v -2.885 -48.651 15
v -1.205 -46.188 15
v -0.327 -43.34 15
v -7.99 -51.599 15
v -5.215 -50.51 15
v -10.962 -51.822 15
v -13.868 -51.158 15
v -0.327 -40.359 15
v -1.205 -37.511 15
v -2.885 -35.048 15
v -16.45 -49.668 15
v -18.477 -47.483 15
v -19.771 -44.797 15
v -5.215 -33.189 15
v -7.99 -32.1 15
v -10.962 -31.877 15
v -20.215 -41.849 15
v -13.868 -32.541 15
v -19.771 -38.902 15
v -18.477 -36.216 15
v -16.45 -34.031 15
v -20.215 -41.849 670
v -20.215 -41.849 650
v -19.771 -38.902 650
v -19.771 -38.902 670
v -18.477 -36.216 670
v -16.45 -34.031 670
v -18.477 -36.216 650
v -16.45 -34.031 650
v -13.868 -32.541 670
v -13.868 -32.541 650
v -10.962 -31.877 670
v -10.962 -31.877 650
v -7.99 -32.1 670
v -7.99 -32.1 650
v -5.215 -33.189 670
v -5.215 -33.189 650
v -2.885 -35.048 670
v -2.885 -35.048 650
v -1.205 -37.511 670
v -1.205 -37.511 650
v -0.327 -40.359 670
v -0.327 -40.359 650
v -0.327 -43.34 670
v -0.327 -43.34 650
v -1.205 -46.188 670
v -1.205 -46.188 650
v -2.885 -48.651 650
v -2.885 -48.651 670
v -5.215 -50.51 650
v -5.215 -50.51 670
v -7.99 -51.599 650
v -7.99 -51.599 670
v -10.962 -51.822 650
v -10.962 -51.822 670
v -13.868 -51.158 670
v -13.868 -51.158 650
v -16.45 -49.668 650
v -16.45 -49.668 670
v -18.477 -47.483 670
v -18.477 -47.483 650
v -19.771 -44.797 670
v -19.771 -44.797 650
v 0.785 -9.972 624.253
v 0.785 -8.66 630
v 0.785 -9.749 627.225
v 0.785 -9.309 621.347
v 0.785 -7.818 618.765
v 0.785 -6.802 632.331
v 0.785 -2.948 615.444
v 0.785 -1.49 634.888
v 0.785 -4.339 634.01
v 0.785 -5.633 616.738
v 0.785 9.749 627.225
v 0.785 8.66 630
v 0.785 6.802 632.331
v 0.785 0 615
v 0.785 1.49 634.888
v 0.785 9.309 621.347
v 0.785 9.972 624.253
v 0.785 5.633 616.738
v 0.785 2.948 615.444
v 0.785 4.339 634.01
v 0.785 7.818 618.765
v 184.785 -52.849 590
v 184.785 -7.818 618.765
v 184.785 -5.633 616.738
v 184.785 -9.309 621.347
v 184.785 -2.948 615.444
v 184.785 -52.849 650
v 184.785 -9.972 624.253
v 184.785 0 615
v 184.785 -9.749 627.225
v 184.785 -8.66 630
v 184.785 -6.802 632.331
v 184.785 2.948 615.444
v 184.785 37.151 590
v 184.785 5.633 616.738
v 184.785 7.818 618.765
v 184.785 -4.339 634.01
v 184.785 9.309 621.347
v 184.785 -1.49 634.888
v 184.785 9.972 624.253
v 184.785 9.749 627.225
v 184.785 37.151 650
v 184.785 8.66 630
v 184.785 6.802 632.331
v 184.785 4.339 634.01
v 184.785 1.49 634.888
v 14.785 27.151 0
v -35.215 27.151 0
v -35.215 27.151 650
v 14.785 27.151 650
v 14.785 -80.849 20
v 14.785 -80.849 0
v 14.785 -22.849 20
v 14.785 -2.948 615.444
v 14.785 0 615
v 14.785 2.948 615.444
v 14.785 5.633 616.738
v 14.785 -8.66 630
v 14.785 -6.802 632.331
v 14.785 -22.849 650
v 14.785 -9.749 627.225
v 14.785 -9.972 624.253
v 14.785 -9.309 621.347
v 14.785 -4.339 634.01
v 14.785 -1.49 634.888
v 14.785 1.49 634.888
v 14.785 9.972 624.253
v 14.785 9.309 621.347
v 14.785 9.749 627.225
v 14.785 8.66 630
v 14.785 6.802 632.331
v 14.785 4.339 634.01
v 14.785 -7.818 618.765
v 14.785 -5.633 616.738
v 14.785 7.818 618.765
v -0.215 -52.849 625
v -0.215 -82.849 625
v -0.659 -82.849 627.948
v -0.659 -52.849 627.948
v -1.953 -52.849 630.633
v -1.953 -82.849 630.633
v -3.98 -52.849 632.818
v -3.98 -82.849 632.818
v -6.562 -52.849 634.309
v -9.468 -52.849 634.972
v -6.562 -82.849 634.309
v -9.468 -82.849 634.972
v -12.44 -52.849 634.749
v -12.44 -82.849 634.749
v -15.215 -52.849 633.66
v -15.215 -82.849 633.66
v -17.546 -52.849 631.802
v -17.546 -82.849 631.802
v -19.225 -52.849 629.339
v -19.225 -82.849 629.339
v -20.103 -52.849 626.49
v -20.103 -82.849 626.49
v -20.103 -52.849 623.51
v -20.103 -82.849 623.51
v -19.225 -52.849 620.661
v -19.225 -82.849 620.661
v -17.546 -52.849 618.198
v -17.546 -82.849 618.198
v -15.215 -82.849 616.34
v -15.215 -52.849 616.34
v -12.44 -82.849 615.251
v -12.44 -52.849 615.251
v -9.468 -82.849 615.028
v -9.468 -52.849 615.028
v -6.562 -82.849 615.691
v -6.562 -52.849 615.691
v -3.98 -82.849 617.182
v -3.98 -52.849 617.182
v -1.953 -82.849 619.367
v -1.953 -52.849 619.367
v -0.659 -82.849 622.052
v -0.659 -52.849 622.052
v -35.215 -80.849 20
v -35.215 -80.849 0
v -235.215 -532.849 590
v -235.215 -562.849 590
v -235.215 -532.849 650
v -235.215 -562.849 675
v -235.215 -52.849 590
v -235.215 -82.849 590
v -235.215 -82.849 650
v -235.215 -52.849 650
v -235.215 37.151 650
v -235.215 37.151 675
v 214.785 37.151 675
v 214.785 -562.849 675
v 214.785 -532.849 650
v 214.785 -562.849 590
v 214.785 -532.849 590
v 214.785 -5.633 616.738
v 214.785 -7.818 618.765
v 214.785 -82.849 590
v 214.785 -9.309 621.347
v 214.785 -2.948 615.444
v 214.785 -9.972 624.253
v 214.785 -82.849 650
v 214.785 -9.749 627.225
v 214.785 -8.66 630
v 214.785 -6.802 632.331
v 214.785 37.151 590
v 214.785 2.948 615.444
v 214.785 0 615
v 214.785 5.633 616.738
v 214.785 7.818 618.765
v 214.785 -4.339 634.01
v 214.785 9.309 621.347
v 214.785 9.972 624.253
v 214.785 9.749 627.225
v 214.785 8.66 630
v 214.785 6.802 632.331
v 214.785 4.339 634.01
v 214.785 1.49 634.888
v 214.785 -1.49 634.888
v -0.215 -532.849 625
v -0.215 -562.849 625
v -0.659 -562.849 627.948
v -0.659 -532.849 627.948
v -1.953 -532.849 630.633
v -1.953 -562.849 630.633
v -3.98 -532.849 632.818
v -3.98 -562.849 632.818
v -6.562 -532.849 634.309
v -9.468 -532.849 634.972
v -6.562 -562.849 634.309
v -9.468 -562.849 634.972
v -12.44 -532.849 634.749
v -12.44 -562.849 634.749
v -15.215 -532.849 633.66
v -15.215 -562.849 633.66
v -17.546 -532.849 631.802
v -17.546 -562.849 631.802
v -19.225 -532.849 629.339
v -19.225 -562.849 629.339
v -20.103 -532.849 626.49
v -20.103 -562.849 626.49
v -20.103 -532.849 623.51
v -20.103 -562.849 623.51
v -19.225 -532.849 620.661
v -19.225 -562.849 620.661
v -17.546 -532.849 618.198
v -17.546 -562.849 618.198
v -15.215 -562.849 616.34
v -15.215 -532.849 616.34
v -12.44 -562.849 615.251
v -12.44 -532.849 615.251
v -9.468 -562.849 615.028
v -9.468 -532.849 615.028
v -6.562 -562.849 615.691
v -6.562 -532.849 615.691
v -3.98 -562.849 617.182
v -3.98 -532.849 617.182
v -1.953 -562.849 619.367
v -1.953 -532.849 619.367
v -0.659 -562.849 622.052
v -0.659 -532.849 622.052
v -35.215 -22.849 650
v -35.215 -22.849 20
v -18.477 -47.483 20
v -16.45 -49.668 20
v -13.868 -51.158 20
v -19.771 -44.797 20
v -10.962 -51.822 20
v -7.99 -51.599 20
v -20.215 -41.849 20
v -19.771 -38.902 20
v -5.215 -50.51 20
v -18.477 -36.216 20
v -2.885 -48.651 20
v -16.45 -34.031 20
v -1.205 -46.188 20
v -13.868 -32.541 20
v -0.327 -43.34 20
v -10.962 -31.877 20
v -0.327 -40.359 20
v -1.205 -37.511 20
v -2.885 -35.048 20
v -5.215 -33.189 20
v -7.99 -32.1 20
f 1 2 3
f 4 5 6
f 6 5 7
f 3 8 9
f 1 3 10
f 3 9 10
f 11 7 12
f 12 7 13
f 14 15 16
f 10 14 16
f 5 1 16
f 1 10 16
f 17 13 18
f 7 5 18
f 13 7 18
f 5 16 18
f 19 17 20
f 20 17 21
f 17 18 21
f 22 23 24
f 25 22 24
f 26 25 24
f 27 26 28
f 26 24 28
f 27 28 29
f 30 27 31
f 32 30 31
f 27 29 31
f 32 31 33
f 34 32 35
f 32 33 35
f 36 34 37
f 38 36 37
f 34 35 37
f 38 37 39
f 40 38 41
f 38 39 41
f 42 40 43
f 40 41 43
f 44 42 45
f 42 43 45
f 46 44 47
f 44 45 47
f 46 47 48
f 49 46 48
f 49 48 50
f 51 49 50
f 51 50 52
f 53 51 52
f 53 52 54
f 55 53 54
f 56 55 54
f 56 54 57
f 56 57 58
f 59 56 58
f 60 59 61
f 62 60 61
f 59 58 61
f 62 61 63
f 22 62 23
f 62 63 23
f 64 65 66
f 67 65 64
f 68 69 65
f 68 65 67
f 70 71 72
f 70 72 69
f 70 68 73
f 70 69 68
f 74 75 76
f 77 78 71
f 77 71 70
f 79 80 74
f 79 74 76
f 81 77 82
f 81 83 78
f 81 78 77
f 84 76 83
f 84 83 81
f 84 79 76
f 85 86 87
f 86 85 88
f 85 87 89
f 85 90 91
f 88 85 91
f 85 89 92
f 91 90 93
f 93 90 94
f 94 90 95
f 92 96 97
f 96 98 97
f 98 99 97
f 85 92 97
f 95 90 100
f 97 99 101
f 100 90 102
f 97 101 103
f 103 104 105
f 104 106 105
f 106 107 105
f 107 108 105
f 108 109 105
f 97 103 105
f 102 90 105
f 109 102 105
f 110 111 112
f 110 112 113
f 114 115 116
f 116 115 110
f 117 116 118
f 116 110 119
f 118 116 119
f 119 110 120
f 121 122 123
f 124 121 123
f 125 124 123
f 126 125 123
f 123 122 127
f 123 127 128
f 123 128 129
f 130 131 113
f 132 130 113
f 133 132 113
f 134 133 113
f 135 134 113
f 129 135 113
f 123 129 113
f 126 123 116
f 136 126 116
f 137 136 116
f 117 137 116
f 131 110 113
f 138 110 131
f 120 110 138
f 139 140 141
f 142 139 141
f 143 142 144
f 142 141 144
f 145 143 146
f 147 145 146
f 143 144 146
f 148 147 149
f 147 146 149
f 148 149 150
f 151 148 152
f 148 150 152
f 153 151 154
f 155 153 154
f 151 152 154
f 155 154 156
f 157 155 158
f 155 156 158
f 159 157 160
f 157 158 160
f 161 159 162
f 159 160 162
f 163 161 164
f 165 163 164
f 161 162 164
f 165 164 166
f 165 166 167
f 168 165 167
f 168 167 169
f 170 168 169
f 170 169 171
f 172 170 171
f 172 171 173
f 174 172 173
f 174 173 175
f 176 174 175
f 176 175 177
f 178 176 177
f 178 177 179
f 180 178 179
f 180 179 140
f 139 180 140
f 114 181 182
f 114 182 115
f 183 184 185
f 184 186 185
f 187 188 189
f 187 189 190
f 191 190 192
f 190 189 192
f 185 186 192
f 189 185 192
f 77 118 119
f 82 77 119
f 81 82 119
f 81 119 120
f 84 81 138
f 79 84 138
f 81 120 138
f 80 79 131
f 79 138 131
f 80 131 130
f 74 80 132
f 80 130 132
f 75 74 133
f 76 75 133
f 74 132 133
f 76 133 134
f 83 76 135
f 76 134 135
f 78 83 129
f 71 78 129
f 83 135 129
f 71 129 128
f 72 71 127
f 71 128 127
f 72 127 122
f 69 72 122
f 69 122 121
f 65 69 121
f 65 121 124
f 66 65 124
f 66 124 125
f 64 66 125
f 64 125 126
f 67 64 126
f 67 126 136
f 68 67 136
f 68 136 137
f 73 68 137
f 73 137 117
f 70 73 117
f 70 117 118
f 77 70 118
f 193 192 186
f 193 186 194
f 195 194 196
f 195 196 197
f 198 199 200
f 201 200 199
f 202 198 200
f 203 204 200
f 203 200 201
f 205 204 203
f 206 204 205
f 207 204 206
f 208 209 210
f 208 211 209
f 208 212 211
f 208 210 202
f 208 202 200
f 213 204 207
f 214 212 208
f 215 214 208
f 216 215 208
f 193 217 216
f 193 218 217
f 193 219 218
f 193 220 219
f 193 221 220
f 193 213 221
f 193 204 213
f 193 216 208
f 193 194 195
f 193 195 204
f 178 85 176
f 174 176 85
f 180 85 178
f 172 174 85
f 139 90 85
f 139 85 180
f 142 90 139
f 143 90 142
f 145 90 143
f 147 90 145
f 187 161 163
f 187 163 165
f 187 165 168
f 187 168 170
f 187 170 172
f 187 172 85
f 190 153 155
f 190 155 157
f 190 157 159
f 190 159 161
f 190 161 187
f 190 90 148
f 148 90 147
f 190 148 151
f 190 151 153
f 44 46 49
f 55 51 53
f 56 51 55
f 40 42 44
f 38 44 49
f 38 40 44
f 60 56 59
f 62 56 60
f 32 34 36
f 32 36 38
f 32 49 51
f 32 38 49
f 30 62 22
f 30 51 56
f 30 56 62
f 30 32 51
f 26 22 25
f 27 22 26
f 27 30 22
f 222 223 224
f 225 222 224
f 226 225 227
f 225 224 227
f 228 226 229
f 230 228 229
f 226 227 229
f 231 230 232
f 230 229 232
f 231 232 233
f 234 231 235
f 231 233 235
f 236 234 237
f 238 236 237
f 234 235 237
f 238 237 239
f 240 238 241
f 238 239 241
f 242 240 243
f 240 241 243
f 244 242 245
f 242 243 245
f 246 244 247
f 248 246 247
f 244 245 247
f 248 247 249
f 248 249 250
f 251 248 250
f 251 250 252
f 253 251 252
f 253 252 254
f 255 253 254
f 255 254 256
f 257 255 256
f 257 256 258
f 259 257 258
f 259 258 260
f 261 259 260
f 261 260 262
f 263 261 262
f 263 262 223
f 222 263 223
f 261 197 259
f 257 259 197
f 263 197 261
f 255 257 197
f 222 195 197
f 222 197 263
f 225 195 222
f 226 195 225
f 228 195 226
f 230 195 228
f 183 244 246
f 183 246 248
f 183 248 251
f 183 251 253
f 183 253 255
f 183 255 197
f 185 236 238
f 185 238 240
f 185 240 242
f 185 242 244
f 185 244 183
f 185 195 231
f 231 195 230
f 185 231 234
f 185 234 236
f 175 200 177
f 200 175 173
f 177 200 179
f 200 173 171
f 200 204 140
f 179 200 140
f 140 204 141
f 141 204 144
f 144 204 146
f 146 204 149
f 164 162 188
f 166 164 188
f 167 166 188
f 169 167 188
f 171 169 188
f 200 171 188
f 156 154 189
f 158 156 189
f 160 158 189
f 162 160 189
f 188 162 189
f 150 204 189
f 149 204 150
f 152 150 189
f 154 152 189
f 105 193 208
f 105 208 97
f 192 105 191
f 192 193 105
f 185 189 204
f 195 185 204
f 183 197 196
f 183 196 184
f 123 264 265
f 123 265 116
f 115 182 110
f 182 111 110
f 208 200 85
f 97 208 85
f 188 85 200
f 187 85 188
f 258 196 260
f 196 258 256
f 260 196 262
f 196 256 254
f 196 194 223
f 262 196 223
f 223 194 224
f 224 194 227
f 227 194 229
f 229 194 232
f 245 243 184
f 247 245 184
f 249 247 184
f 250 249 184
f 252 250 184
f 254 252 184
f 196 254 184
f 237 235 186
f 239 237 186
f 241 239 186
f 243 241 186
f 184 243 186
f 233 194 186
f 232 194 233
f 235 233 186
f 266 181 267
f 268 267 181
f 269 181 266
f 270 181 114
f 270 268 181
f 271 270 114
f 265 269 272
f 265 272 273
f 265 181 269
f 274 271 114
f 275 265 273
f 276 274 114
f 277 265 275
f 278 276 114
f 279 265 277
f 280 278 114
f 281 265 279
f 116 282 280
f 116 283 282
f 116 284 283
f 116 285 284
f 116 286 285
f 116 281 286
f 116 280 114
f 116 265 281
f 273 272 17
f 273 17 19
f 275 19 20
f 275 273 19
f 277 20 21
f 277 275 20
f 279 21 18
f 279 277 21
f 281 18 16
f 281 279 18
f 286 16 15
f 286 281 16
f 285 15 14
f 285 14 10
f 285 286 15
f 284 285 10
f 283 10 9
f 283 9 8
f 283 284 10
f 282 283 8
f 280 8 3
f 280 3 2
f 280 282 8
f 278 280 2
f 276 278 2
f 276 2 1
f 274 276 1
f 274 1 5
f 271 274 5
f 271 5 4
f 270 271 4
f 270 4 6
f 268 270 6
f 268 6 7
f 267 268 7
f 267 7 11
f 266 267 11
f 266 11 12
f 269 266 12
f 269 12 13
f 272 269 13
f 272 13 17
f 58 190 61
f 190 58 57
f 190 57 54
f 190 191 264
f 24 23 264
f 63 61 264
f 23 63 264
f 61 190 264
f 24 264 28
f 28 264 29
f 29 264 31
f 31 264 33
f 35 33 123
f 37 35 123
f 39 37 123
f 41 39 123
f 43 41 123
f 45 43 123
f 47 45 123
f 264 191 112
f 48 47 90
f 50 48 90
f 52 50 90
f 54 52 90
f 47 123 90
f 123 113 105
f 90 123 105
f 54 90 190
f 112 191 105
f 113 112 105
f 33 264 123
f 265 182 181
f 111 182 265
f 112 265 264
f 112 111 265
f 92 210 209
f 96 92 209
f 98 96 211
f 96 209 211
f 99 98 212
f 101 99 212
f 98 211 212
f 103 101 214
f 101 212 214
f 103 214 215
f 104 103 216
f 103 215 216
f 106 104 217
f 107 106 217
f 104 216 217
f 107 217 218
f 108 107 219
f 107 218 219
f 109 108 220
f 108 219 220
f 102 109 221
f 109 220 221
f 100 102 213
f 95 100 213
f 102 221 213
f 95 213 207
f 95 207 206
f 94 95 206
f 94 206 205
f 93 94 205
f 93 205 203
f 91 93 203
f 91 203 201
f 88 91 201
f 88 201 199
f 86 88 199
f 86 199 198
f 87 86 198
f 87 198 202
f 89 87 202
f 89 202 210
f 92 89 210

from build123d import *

# Parameters (mm, degrees)
SKETCH1_W               = 50
SKETCH1_H               = 50
BOSS_EXTRUDE1_DEPTH     = 650
SKETCH2_W               = 450
SKETCH2_H               = 600
BOSS_EXTRUDE2_DEPTH     = 25
SKETCH4_W               = 450
SKETCH4_H               = 30
BOSS_EXTRUDE3_DEPTH     = 60
SKETCH5_R               = 10
CUT_EXTRUDE1_DEPTH      = 510
SKETCH7_W               = 50
SKETCH7_H               = 20
BOSS_EXTRUDE4_DEPTH     = 58
SKETCH8_R               = 10
CUT_EXTRUDE3_DEPTH      = 635
CUT_EXTRUDE3_DEPTH_BACK = 20
SKETCH9_W               = 30
SKETCH9_H               = 90
BOSS_EXTRUDE5_DEPTH     = 60
SKETCH10_R              = 10
CUT_EXTRUDE4_DEPTH      = 214


with BuildPart() as part:
    # Sketch1 → Boss-Extrude1 (new body)
    with BuildSketch(Plane.XY):
        with Locations((-10.215053763, 2.150537634)):
            Rectangle(SKETCH1_W, SKETCH1_H)
    extrude(amount=BOSS_EXTRUDE1_DEPTH)

    # Sketch2 → Boss-Extrude2 (add)
    with BuildSketch(Plane.XY.offset(650)):
        with Locations((-10.215053763, -262.849462366)):
            Rectangle(SKETCH2_W, SKETCH2_H)
    extrude(amount=BOSS_EXTRUDE2_DEPTH)

    # Sketch4 → Boss-Extrude3 (add)
    with BuildSketch(Plane(origin=(0, 0, 650), x_dir=(-1, 0, 0), z_dir=(0, 0, -1))):
        with Locations((10.215053763, -547.849462366)):
            Rectangle(SKETCH4_W, SKETCH4_H)
        with Locations((10.215053763, -67.849462366)):
            Rectangle(SKETCH4_W, SKETCH4_H)
    extrude(amount=BOSS_EXTRUDE3_DEPTH)

    # Sketch5 → Cut-Extrude1 (cut)
    with BuildSketch(Plane.XZ.offset(562.849462366)):
        with Locations((-10.215053763, 625)):
            Circle(SKETCH5_R)
    extrude(amount=-CUT_EXTRUDE1_DEPTH, mode=Mode.SUBTRACT)

    # Sketch7 → Boss-Extrude4 (add)
    with BuildSketch(Plane.XZ.offset(22.849462366)):
        with Locations((-10.215053763, 10)):
            Rectangle(SKETCH7_W, SKETCH7_H)
    extrude(amount=BOSS_EXTRUDE4_DEPTH)

    # Sketch8 → Cut-Extrude3 (cut, two sides)
    with BuildSketch(Plane(origin=(0, 0, 650), x_dir=(-1, 0, 0), z_dir=(0, 0, -1))) as cut_extrude3_sk:
        with Locations((10.215053763, -41.849462366)):
            Circle(SKETCH8_R)
    extrude(amount=CUT_EXTRUDE3_DEPTH, mode=Mode.SUBTRACT)
    extrude(cut_extrude3_sk.sketch, amount=-CUT_EXTRUDE3_DEPTH_BACK, mode=Mode.SUBTRACT)

    # Sketch9 → Boss-Extrude5 (add)
    with BuildSketch(Plane(origin=(0, 0, 650), x_dir=(-1, 0, 0), z_dir=(0, 0, -1))):
        with Locations((-199.784946237, -7.849462366)):
            Rectangle(SKETCH9_W, SKETCH9_H)
    extrude(amount=BOSS_EXTRUDE5_DEPTH)

    # Sketch10 → Cut-Extrude4 (cut)
    with BuildSketch(Plane(origin=(214.784946237, 0, 0), x_dir=(0, 0, -1), z_dir=(1, 0, 0))):
        with Locations((-625, 0)):
            Circle(SKETCH10_R)
    extrude(amount=-CUT_EXTRUDE4_DEPTH, mode=Mode.SUBTRACT)


solid = part.part
